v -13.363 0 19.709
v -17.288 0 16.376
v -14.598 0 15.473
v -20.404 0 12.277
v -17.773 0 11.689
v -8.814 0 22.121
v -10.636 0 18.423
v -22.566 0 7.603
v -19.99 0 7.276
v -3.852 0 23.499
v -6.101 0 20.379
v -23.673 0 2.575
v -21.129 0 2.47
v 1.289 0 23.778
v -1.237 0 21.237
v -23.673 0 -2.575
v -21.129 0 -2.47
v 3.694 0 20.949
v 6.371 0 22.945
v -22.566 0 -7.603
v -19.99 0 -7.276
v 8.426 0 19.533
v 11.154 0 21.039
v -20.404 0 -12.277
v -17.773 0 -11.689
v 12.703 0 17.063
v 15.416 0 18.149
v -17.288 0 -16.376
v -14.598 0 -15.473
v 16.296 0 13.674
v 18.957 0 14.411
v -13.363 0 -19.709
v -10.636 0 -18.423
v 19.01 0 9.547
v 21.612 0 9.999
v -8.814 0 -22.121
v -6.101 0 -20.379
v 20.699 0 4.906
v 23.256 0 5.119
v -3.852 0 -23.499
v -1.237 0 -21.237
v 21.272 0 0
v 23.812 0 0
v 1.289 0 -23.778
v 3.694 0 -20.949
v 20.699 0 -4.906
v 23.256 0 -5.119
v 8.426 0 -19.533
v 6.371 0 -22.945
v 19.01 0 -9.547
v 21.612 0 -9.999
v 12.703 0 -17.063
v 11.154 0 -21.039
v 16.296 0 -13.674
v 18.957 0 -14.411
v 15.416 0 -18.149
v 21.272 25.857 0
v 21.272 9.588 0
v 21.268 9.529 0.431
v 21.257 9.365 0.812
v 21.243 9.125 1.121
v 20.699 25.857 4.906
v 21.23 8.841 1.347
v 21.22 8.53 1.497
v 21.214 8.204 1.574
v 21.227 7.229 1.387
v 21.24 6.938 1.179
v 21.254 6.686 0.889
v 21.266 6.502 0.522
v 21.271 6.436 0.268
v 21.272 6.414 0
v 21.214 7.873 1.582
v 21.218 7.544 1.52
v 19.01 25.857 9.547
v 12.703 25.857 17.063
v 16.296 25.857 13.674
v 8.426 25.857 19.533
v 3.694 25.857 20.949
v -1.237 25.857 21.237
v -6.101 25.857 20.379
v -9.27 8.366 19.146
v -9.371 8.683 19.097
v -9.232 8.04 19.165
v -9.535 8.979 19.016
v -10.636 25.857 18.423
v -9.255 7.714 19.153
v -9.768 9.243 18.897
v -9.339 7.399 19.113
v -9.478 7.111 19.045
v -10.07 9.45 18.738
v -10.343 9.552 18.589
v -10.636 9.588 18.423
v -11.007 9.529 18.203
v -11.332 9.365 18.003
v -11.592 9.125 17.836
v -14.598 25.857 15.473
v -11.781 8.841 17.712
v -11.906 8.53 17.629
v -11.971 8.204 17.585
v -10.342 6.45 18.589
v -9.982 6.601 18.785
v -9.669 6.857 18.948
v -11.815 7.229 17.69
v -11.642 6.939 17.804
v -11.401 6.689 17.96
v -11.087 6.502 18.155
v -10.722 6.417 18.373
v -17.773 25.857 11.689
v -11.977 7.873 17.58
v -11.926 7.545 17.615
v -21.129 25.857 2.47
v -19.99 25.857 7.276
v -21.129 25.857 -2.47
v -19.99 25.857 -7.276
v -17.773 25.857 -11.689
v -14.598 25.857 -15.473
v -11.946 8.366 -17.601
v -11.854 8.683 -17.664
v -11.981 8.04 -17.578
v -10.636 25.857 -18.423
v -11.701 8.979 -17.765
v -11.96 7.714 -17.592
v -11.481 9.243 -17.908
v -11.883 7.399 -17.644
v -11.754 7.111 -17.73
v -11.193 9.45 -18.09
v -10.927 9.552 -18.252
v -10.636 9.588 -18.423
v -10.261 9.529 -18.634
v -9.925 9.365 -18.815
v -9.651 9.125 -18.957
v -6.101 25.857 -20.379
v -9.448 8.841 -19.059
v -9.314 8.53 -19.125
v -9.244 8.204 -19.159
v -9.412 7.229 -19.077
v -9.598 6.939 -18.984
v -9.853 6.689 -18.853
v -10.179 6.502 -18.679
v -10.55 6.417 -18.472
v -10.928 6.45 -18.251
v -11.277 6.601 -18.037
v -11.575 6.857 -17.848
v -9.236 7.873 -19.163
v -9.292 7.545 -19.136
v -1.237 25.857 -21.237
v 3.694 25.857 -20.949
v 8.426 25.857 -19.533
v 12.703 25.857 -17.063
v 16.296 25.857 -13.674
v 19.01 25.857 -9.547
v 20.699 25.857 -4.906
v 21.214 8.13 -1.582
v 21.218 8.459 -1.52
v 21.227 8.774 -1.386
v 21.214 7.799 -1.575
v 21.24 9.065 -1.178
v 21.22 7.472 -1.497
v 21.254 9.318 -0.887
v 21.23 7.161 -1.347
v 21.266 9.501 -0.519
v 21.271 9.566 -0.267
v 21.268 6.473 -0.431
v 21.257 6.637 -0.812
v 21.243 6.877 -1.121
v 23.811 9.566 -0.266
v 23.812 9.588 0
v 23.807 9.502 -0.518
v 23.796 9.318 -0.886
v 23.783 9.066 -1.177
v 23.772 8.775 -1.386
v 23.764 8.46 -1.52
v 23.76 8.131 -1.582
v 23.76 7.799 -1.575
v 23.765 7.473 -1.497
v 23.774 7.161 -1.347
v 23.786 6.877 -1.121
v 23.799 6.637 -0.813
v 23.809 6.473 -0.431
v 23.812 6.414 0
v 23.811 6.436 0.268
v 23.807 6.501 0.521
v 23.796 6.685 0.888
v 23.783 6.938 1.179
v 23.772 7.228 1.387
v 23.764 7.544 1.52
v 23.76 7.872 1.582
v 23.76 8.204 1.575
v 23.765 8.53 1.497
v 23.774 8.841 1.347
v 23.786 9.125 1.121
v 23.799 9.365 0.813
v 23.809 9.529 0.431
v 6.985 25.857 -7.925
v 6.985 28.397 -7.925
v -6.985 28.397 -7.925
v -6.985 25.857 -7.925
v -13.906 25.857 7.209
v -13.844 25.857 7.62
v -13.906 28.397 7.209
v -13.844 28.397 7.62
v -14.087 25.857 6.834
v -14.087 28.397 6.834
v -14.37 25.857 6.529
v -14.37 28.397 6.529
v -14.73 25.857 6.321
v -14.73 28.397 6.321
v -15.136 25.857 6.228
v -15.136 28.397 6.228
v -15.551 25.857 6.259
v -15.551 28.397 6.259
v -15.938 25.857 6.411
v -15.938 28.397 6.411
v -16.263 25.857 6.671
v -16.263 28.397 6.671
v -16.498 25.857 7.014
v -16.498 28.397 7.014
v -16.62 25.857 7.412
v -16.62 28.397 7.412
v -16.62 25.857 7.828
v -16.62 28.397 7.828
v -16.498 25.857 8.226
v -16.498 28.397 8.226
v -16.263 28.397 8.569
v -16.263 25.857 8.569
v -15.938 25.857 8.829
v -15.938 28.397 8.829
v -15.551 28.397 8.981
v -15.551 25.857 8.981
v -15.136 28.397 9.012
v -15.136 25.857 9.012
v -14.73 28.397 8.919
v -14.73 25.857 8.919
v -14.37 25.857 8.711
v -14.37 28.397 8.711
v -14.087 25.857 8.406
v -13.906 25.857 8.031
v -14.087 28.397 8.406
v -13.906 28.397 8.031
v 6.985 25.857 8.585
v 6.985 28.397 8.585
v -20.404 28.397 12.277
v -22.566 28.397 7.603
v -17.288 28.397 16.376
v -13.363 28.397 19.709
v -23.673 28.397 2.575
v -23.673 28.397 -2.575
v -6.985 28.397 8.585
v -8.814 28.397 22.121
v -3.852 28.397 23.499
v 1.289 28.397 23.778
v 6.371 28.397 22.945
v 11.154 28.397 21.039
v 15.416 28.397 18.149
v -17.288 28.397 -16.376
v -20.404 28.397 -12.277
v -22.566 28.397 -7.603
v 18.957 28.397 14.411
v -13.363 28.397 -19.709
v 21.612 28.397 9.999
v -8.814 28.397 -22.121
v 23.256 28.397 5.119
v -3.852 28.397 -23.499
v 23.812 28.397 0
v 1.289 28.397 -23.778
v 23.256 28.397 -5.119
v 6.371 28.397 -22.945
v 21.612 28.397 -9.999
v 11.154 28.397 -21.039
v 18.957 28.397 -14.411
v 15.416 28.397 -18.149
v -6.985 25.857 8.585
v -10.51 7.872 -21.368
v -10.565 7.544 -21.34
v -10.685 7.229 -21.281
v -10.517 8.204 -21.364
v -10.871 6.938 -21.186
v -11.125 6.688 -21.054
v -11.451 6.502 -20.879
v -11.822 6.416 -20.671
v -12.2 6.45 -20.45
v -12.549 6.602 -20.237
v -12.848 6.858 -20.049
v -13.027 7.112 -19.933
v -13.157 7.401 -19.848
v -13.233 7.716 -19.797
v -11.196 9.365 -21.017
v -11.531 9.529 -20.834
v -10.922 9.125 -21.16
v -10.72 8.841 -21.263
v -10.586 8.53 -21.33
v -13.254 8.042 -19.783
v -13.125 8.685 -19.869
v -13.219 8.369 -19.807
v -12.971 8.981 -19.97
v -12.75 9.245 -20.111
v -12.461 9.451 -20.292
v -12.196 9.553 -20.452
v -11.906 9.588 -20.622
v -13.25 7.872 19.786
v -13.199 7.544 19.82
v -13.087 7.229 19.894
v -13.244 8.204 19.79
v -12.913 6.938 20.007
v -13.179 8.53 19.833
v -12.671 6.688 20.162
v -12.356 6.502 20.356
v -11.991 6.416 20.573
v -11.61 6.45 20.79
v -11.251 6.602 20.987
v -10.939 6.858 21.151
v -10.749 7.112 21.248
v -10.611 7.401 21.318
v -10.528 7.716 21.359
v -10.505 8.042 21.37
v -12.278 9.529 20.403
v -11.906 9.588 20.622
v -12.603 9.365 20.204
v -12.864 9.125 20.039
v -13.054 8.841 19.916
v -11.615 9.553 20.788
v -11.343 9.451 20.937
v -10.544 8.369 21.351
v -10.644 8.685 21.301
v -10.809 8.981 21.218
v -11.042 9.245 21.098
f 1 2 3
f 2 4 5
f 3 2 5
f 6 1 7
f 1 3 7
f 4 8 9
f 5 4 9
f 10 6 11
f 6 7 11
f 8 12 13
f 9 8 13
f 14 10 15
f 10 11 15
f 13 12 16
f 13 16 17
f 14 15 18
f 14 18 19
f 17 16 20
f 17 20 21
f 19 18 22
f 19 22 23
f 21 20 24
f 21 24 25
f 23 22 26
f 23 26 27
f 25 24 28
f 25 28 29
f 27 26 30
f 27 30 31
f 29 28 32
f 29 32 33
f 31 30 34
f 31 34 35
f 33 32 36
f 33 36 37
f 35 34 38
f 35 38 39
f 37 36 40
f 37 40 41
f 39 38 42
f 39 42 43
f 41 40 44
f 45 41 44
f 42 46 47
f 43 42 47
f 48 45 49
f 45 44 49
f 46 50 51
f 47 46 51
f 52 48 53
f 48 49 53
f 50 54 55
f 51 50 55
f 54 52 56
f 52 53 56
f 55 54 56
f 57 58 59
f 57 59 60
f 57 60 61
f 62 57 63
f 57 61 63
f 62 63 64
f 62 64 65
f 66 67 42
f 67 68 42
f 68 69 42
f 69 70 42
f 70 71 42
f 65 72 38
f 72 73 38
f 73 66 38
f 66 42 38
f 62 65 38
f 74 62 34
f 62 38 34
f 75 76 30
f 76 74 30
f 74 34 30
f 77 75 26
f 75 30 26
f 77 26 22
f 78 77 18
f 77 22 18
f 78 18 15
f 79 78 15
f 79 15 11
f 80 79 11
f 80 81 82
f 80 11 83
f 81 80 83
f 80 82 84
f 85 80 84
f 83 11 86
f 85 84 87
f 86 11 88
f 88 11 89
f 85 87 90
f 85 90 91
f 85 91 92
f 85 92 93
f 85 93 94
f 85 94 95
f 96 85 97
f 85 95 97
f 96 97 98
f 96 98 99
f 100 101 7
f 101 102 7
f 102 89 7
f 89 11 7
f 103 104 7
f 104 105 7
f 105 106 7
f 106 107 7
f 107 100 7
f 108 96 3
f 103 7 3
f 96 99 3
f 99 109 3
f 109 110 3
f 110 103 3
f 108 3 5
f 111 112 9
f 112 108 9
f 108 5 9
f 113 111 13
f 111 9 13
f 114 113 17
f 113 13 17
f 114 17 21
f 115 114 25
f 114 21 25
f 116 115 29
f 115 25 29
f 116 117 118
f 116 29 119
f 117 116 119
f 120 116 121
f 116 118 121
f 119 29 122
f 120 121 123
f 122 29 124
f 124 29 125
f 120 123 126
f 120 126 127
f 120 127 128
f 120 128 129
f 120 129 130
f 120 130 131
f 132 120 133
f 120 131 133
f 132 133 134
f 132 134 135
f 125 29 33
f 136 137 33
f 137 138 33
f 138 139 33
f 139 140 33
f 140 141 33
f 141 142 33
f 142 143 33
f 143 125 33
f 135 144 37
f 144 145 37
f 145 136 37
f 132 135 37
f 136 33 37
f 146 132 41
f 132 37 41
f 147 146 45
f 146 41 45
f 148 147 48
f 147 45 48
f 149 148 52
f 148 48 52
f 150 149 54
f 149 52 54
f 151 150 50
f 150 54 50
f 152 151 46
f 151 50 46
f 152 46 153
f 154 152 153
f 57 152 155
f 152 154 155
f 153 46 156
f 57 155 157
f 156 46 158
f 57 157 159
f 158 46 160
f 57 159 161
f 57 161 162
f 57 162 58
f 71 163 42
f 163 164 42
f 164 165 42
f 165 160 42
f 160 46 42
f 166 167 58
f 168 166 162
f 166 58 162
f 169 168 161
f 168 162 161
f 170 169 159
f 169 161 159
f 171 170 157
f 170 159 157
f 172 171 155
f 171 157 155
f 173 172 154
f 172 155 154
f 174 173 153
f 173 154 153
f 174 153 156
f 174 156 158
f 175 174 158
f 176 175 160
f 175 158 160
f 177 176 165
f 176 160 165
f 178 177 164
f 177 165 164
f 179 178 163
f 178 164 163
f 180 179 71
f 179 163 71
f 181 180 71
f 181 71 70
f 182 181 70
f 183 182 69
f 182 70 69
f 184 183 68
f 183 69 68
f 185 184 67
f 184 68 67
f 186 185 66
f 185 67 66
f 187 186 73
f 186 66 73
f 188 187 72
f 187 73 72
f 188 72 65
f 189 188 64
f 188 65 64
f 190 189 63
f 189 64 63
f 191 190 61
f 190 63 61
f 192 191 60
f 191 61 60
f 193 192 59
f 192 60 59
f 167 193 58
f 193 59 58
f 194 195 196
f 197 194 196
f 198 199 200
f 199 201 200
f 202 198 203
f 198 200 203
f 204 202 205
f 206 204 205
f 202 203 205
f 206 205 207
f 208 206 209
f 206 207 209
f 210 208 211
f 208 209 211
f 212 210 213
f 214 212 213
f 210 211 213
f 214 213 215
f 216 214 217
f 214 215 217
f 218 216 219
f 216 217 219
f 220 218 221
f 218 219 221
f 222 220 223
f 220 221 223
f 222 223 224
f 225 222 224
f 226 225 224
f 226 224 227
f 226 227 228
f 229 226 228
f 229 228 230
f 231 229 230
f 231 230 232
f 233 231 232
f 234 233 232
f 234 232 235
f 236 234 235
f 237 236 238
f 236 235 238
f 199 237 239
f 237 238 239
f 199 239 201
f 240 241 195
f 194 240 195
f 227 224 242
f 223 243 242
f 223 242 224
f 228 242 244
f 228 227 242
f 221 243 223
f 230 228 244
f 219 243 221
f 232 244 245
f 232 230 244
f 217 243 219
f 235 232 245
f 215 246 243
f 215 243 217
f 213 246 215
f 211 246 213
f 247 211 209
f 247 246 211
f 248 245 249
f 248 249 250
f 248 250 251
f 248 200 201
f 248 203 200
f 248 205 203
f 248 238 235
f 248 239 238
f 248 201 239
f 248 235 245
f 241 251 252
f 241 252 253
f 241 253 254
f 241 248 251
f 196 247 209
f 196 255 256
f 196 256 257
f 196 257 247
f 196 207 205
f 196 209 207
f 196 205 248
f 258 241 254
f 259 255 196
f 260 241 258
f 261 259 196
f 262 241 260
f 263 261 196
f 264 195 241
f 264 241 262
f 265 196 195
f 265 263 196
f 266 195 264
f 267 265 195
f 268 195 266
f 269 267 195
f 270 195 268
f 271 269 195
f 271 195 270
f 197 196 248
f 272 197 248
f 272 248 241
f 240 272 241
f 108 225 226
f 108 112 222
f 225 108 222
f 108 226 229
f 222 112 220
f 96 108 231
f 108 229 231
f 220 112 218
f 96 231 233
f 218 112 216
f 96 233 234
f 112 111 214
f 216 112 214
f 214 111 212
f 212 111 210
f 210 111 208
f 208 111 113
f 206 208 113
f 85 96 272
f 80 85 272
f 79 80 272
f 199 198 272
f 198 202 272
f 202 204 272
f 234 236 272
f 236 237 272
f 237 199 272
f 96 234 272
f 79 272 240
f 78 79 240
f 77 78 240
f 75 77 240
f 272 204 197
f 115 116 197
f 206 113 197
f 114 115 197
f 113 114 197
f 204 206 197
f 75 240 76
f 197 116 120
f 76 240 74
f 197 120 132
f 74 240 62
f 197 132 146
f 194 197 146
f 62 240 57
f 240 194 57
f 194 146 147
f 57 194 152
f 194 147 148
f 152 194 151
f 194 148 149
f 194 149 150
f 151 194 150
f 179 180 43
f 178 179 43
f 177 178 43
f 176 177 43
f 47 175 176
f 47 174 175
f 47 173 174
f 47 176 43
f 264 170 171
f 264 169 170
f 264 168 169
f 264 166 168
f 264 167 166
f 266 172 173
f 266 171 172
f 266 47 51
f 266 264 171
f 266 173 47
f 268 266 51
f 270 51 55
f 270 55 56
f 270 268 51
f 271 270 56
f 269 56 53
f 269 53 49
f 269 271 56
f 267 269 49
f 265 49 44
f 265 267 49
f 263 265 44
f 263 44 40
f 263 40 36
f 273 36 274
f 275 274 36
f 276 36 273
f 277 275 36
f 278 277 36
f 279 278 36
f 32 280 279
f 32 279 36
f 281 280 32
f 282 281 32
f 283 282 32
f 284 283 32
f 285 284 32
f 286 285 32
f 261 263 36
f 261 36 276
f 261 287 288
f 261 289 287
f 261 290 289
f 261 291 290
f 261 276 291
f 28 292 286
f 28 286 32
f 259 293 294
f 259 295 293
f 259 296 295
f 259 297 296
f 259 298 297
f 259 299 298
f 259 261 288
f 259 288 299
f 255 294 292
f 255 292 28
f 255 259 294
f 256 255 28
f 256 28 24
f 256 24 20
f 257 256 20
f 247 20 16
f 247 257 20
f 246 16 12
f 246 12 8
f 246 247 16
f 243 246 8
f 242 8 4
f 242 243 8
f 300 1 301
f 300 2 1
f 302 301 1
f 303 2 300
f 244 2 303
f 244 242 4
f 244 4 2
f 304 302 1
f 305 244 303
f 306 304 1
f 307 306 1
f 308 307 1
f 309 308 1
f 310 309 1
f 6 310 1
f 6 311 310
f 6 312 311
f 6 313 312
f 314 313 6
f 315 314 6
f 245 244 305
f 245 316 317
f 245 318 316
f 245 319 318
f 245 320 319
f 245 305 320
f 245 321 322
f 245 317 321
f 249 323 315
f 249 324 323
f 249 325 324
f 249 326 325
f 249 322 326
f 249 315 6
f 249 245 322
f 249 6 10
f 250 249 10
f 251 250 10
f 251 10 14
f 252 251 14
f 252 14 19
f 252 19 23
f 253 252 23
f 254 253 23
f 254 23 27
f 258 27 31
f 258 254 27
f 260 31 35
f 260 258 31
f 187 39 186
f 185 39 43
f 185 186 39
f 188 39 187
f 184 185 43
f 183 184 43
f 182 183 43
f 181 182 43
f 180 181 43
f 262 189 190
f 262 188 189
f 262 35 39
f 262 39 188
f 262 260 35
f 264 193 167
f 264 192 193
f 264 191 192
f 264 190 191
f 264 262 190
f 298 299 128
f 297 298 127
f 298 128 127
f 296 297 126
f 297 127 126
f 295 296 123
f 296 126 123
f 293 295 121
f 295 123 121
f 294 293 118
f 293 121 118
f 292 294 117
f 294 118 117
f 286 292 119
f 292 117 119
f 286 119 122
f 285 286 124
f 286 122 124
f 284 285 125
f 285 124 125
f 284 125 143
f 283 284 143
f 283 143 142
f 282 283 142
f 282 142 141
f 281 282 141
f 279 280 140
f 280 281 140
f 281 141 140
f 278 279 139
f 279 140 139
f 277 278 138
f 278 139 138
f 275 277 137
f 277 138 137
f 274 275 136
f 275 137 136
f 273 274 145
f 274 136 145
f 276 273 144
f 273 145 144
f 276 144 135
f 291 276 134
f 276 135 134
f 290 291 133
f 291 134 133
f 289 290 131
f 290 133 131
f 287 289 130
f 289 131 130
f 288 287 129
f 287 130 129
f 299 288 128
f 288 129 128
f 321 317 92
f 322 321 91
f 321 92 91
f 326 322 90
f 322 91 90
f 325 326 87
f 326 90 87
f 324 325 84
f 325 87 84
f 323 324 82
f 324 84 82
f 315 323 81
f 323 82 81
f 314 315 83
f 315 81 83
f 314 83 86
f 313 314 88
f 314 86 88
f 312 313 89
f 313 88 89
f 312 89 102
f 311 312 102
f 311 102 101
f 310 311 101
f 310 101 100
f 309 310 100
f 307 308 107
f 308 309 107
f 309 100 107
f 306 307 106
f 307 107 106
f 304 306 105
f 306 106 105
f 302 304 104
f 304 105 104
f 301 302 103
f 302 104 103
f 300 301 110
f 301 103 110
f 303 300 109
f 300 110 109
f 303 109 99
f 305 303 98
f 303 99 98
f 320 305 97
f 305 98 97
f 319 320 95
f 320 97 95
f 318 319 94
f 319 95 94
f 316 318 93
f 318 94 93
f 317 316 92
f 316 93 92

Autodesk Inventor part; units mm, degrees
ref_plane "YZ Plane" through (0, 0, 0) normal (1, 0, 0) x (0, 1, 0)
ref_plane "XZ Plane" through (0, 0, 0) normal (0, 1, 0) x (-1, 0, 0)
ref_plane "XY Plane" through (0, 0, 0) normal (0, 0, 1) x (1, 0, 0)
sketch "Sketch1" plane through (0, 0, 0) normal (0, 0, 1) x (1, 0, 0)
  line L0 (21.2725, 0) -> (23.8125, 0)
  line L1 (23.8125, 0) -> (23.8125, 28.3972)
  line L2 (23.8125, 28.3972) -> (6.985, 28.3972)
  line L3 (21.2725, 25.8572) -> (21.2725, 0)
  line L4 (0, -5.6794) -> (0, 34.0766) projected
  line L5 (6.985, 25.8572) -> (6.985, 28.3972)
  line L6 (6.985, 25.8572) -> (21.2725, 25.8572)
  point P0 (0, 0)
  dimension "d5" = 28.3972
  dimension "d10" = 21.2725
  dimension "d13" = 2.54
  dimension "d22" = 6.985
  dimension "d50" = 2.54
revolve "Revolution1" add sketch "Sketch1" angle 360 about axis through (0, -10, 0) along (0, 1, 0)
sketch "Sketch4" plane through (0, 0, 0) normal (1, 0, 0) x (0, 1, 0)
  circle A0 centre (8.001, 0) radius 1.5875
  point P0 (0, 0)
  dimension "d33" = 3.175
  dimension "d34" = 8.001
extrude "Extrusion2" cut sketch "Sketch4" along normal through all
pattern_circular "Circular Pattern1" count 3 over 360 about axis through (0, 14.1986, 0) along (0, -1, 0) of "Extrusion2"
sketch "Sketch5" plane through (0, 28.3972, 0) normal (0, 1, 0) x (1, 0, 0)
  line L0 (6.985, 7.9248) -> (-6.985, 7.9248)
  line L1 (-6.985, 7.9248) -> (-6.985, -8.5852)
  line L2 (-6.985, -8.5852) -> (6.985, -8.5852)
  line L3 (6.985, -8.5852) -> (6.985, 7.9248)
  line L4 (6.985, 7.9248) -> (-6.985, -8.5852) construction
  line L5 (-6.985, 7.9248) -> (6.985, -8.5852) construction
  circle A0 centre (0, 0) radius 6.985 construction
  point P0 (0, -0.3302)
  dimension "d51" = 13.97
  dimension "d52" = 16.51
  dimension "d56" = 0.3302
extrude "Extrusion3" cut sketch "Sketch5" against normal through all
sketch "Sketch6" plane through (0, 28.3972, 0) normal (0, 1, 0) x (1, 0, 0)
  circle A0 centre (-15.24, -7.62) radius 1.3959
  line L0 (0, 0) -> (-15.24, -7.62) construction
  line L1 (-15.24, -7.62) -> (0, -7.62) construction
  line L2 (0, -7.62) -> (0, 0) construction
  dimension "d59" = 7.62
  dimension "d60" = 15.24
extrude "Extrusion4" cut sketch "Sketch6" against normal through all
properties part number "Gauge Housing"
